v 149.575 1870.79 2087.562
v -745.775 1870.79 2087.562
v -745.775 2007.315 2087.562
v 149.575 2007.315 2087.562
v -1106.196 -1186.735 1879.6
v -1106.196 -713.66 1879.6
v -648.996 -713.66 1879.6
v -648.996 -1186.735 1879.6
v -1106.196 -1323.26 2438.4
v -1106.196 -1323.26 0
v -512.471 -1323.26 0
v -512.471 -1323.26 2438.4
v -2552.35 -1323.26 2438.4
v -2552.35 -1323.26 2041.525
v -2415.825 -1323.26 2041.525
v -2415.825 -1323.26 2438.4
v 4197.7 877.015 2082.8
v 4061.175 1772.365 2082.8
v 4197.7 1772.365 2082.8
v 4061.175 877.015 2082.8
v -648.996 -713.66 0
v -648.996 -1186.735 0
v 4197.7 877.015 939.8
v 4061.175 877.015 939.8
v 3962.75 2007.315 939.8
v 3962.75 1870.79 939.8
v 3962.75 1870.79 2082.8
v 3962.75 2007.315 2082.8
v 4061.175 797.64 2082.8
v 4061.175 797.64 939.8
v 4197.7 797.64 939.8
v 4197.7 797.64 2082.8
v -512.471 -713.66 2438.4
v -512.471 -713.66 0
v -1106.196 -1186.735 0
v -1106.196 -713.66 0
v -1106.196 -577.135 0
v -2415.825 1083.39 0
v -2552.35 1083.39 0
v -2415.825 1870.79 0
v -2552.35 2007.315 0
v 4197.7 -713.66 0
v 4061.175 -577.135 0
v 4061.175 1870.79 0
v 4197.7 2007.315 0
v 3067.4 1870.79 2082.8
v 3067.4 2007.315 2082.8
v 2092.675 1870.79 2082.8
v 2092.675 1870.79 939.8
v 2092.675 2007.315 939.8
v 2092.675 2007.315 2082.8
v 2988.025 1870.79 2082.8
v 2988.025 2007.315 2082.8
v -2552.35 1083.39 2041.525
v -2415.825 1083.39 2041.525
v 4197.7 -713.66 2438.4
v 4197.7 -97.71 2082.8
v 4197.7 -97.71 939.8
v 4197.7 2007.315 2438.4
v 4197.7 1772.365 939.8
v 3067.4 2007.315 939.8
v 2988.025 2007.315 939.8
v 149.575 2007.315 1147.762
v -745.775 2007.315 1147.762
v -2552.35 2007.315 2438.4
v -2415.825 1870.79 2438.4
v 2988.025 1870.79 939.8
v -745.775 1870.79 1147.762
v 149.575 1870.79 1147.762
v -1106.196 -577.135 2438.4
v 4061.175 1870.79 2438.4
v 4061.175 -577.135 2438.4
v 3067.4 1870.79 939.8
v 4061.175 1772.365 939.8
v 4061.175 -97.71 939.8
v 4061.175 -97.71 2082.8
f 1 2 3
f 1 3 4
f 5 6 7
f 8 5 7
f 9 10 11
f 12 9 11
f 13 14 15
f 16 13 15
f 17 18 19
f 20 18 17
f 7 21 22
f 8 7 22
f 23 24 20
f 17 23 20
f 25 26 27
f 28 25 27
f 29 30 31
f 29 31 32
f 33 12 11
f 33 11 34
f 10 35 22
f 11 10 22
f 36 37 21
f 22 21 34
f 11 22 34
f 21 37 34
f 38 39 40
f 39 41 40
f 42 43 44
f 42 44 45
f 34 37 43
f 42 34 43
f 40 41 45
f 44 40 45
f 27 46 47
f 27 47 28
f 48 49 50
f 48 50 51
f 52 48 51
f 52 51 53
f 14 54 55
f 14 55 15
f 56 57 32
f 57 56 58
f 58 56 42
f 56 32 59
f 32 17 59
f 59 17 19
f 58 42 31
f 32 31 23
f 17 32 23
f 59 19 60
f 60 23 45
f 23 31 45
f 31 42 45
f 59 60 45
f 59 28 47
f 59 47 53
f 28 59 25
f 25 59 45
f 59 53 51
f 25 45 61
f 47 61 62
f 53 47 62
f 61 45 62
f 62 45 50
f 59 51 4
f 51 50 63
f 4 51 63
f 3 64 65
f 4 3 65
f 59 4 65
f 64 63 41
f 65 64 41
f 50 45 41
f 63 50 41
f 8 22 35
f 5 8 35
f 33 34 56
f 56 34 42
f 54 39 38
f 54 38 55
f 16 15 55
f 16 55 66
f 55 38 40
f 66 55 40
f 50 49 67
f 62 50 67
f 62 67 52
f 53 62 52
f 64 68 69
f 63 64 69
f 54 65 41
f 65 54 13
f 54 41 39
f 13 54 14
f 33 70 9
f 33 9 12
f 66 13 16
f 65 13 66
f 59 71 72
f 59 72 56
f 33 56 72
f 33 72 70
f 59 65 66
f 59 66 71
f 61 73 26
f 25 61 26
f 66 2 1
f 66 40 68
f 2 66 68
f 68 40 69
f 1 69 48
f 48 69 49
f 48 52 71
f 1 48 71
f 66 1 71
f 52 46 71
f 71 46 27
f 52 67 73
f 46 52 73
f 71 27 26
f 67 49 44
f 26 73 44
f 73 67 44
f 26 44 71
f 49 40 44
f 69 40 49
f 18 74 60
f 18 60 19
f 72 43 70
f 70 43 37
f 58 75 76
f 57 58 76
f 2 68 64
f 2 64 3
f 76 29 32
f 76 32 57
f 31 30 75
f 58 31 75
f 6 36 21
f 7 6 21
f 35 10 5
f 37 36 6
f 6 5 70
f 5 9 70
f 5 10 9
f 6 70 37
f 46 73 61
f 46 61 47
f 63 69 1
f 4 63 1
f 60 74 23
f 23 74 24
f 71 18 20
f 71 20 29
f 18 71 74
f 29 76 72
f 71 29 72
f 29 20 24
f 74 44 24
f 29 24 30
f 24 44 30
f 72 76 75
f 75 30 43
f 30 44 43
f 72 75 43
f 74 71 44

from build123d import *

# Parameters (mm, degrees)
F1_DEPTH = 2438.4
F2_W     = 895.35
F2_H     = 939.8
F2_H_2   = 1143
F3_DEPTH = 136.525
F4_W     = 895.35
F4_H     = 1143
F5_DEPTH = 136.525
F6_W     = 2406.65
F6_H     = 2041.525
F7_DEPTH = 136.525
F8_W     = 457.2
F8_H     = 473.075
F9_DEPTH = 558.8


with BuildPart() as f1:
    # F0 (on Top) → F1 (new body)
    with BuildSketch(Plane.XY):
        Polygon((-2415.824701, -1323.259525), (-2415.824701, 1870.790475), (4061.175299, 1870.790475), (4061.175299, -577.134525), (-1106.196211, -577.134525), (-1106.196211, -713.659525), (-648.996211, -713.659525), (-648.996211, -1186.734525), (-1106.196211, -1186.734525), (-1106.196211, -1323.259525), (-512.471211, -1323.259525), (-512.471211, -713.659525), (4197.700299, -713.659525), (4197.700299, 2007.315475), (-2552.349701, 2007.315475), (-2552.349701, -1323.259525), align=None)
    extrude(amount=F1_DEPTH)

    # F2 (on face) → F3 (cut, through all)
    with BuildSketch(Plane.XZ.offset(-1870.790475)):
        with Locations((-298.099701, 1617.6625)):
            Rectangle(F2_W, F2_H)
        with Locations((2540.350299, 1511.3)):
            Rectangle(F2_W, F2_H_2)
        with Locations((3515.075299, 1511.3)):
            Rectangle(F2_W, F2_H_2)
    extrude(amount=-F3_DEPTH, mode=Mode.SUBTRACT)

    # F4 (on face) → F5 (cut, through all)
    with BuildSketch(Plane(origin=(4061.175299, 0, 0), x_dir=(0, -1, 0), z_dir=(-1, 0, 0))):
        with Locations((-1324.690475, 1511.3)):
            Rectangle(F4_W, F4_H)
        with Locations((-349.965475, 1511.3)):
            Rectangle(F4_W, F4_H)
    extrude(amount=-F5_DEPTH, mode=Mode.SUBTRACT)

    # F6 (on face) → F7 (cut, through all)
    with BuildSketch(Plane(origin=(-2552.349701, 0, 0), x_dir=(0, -1, 0), z_dir=(-1, 0, 0))):
        with Locations((119.934525, 1020.7625)):
            Rectangle(F6_W, F6_H)
    extrude(amount=-F7_DEPTH, mode=Mode.SUBTRACT)

    # F8 (on face) → F9 (join)
    with BuildSketch(Plane.XY.offset(2438.4)):
        with Locations((-877.596211, -950.197025)):
            Rectangle(F8_W, F8_H)
    extrude(amount=-F9_DEPTH)


solid = f1.part
